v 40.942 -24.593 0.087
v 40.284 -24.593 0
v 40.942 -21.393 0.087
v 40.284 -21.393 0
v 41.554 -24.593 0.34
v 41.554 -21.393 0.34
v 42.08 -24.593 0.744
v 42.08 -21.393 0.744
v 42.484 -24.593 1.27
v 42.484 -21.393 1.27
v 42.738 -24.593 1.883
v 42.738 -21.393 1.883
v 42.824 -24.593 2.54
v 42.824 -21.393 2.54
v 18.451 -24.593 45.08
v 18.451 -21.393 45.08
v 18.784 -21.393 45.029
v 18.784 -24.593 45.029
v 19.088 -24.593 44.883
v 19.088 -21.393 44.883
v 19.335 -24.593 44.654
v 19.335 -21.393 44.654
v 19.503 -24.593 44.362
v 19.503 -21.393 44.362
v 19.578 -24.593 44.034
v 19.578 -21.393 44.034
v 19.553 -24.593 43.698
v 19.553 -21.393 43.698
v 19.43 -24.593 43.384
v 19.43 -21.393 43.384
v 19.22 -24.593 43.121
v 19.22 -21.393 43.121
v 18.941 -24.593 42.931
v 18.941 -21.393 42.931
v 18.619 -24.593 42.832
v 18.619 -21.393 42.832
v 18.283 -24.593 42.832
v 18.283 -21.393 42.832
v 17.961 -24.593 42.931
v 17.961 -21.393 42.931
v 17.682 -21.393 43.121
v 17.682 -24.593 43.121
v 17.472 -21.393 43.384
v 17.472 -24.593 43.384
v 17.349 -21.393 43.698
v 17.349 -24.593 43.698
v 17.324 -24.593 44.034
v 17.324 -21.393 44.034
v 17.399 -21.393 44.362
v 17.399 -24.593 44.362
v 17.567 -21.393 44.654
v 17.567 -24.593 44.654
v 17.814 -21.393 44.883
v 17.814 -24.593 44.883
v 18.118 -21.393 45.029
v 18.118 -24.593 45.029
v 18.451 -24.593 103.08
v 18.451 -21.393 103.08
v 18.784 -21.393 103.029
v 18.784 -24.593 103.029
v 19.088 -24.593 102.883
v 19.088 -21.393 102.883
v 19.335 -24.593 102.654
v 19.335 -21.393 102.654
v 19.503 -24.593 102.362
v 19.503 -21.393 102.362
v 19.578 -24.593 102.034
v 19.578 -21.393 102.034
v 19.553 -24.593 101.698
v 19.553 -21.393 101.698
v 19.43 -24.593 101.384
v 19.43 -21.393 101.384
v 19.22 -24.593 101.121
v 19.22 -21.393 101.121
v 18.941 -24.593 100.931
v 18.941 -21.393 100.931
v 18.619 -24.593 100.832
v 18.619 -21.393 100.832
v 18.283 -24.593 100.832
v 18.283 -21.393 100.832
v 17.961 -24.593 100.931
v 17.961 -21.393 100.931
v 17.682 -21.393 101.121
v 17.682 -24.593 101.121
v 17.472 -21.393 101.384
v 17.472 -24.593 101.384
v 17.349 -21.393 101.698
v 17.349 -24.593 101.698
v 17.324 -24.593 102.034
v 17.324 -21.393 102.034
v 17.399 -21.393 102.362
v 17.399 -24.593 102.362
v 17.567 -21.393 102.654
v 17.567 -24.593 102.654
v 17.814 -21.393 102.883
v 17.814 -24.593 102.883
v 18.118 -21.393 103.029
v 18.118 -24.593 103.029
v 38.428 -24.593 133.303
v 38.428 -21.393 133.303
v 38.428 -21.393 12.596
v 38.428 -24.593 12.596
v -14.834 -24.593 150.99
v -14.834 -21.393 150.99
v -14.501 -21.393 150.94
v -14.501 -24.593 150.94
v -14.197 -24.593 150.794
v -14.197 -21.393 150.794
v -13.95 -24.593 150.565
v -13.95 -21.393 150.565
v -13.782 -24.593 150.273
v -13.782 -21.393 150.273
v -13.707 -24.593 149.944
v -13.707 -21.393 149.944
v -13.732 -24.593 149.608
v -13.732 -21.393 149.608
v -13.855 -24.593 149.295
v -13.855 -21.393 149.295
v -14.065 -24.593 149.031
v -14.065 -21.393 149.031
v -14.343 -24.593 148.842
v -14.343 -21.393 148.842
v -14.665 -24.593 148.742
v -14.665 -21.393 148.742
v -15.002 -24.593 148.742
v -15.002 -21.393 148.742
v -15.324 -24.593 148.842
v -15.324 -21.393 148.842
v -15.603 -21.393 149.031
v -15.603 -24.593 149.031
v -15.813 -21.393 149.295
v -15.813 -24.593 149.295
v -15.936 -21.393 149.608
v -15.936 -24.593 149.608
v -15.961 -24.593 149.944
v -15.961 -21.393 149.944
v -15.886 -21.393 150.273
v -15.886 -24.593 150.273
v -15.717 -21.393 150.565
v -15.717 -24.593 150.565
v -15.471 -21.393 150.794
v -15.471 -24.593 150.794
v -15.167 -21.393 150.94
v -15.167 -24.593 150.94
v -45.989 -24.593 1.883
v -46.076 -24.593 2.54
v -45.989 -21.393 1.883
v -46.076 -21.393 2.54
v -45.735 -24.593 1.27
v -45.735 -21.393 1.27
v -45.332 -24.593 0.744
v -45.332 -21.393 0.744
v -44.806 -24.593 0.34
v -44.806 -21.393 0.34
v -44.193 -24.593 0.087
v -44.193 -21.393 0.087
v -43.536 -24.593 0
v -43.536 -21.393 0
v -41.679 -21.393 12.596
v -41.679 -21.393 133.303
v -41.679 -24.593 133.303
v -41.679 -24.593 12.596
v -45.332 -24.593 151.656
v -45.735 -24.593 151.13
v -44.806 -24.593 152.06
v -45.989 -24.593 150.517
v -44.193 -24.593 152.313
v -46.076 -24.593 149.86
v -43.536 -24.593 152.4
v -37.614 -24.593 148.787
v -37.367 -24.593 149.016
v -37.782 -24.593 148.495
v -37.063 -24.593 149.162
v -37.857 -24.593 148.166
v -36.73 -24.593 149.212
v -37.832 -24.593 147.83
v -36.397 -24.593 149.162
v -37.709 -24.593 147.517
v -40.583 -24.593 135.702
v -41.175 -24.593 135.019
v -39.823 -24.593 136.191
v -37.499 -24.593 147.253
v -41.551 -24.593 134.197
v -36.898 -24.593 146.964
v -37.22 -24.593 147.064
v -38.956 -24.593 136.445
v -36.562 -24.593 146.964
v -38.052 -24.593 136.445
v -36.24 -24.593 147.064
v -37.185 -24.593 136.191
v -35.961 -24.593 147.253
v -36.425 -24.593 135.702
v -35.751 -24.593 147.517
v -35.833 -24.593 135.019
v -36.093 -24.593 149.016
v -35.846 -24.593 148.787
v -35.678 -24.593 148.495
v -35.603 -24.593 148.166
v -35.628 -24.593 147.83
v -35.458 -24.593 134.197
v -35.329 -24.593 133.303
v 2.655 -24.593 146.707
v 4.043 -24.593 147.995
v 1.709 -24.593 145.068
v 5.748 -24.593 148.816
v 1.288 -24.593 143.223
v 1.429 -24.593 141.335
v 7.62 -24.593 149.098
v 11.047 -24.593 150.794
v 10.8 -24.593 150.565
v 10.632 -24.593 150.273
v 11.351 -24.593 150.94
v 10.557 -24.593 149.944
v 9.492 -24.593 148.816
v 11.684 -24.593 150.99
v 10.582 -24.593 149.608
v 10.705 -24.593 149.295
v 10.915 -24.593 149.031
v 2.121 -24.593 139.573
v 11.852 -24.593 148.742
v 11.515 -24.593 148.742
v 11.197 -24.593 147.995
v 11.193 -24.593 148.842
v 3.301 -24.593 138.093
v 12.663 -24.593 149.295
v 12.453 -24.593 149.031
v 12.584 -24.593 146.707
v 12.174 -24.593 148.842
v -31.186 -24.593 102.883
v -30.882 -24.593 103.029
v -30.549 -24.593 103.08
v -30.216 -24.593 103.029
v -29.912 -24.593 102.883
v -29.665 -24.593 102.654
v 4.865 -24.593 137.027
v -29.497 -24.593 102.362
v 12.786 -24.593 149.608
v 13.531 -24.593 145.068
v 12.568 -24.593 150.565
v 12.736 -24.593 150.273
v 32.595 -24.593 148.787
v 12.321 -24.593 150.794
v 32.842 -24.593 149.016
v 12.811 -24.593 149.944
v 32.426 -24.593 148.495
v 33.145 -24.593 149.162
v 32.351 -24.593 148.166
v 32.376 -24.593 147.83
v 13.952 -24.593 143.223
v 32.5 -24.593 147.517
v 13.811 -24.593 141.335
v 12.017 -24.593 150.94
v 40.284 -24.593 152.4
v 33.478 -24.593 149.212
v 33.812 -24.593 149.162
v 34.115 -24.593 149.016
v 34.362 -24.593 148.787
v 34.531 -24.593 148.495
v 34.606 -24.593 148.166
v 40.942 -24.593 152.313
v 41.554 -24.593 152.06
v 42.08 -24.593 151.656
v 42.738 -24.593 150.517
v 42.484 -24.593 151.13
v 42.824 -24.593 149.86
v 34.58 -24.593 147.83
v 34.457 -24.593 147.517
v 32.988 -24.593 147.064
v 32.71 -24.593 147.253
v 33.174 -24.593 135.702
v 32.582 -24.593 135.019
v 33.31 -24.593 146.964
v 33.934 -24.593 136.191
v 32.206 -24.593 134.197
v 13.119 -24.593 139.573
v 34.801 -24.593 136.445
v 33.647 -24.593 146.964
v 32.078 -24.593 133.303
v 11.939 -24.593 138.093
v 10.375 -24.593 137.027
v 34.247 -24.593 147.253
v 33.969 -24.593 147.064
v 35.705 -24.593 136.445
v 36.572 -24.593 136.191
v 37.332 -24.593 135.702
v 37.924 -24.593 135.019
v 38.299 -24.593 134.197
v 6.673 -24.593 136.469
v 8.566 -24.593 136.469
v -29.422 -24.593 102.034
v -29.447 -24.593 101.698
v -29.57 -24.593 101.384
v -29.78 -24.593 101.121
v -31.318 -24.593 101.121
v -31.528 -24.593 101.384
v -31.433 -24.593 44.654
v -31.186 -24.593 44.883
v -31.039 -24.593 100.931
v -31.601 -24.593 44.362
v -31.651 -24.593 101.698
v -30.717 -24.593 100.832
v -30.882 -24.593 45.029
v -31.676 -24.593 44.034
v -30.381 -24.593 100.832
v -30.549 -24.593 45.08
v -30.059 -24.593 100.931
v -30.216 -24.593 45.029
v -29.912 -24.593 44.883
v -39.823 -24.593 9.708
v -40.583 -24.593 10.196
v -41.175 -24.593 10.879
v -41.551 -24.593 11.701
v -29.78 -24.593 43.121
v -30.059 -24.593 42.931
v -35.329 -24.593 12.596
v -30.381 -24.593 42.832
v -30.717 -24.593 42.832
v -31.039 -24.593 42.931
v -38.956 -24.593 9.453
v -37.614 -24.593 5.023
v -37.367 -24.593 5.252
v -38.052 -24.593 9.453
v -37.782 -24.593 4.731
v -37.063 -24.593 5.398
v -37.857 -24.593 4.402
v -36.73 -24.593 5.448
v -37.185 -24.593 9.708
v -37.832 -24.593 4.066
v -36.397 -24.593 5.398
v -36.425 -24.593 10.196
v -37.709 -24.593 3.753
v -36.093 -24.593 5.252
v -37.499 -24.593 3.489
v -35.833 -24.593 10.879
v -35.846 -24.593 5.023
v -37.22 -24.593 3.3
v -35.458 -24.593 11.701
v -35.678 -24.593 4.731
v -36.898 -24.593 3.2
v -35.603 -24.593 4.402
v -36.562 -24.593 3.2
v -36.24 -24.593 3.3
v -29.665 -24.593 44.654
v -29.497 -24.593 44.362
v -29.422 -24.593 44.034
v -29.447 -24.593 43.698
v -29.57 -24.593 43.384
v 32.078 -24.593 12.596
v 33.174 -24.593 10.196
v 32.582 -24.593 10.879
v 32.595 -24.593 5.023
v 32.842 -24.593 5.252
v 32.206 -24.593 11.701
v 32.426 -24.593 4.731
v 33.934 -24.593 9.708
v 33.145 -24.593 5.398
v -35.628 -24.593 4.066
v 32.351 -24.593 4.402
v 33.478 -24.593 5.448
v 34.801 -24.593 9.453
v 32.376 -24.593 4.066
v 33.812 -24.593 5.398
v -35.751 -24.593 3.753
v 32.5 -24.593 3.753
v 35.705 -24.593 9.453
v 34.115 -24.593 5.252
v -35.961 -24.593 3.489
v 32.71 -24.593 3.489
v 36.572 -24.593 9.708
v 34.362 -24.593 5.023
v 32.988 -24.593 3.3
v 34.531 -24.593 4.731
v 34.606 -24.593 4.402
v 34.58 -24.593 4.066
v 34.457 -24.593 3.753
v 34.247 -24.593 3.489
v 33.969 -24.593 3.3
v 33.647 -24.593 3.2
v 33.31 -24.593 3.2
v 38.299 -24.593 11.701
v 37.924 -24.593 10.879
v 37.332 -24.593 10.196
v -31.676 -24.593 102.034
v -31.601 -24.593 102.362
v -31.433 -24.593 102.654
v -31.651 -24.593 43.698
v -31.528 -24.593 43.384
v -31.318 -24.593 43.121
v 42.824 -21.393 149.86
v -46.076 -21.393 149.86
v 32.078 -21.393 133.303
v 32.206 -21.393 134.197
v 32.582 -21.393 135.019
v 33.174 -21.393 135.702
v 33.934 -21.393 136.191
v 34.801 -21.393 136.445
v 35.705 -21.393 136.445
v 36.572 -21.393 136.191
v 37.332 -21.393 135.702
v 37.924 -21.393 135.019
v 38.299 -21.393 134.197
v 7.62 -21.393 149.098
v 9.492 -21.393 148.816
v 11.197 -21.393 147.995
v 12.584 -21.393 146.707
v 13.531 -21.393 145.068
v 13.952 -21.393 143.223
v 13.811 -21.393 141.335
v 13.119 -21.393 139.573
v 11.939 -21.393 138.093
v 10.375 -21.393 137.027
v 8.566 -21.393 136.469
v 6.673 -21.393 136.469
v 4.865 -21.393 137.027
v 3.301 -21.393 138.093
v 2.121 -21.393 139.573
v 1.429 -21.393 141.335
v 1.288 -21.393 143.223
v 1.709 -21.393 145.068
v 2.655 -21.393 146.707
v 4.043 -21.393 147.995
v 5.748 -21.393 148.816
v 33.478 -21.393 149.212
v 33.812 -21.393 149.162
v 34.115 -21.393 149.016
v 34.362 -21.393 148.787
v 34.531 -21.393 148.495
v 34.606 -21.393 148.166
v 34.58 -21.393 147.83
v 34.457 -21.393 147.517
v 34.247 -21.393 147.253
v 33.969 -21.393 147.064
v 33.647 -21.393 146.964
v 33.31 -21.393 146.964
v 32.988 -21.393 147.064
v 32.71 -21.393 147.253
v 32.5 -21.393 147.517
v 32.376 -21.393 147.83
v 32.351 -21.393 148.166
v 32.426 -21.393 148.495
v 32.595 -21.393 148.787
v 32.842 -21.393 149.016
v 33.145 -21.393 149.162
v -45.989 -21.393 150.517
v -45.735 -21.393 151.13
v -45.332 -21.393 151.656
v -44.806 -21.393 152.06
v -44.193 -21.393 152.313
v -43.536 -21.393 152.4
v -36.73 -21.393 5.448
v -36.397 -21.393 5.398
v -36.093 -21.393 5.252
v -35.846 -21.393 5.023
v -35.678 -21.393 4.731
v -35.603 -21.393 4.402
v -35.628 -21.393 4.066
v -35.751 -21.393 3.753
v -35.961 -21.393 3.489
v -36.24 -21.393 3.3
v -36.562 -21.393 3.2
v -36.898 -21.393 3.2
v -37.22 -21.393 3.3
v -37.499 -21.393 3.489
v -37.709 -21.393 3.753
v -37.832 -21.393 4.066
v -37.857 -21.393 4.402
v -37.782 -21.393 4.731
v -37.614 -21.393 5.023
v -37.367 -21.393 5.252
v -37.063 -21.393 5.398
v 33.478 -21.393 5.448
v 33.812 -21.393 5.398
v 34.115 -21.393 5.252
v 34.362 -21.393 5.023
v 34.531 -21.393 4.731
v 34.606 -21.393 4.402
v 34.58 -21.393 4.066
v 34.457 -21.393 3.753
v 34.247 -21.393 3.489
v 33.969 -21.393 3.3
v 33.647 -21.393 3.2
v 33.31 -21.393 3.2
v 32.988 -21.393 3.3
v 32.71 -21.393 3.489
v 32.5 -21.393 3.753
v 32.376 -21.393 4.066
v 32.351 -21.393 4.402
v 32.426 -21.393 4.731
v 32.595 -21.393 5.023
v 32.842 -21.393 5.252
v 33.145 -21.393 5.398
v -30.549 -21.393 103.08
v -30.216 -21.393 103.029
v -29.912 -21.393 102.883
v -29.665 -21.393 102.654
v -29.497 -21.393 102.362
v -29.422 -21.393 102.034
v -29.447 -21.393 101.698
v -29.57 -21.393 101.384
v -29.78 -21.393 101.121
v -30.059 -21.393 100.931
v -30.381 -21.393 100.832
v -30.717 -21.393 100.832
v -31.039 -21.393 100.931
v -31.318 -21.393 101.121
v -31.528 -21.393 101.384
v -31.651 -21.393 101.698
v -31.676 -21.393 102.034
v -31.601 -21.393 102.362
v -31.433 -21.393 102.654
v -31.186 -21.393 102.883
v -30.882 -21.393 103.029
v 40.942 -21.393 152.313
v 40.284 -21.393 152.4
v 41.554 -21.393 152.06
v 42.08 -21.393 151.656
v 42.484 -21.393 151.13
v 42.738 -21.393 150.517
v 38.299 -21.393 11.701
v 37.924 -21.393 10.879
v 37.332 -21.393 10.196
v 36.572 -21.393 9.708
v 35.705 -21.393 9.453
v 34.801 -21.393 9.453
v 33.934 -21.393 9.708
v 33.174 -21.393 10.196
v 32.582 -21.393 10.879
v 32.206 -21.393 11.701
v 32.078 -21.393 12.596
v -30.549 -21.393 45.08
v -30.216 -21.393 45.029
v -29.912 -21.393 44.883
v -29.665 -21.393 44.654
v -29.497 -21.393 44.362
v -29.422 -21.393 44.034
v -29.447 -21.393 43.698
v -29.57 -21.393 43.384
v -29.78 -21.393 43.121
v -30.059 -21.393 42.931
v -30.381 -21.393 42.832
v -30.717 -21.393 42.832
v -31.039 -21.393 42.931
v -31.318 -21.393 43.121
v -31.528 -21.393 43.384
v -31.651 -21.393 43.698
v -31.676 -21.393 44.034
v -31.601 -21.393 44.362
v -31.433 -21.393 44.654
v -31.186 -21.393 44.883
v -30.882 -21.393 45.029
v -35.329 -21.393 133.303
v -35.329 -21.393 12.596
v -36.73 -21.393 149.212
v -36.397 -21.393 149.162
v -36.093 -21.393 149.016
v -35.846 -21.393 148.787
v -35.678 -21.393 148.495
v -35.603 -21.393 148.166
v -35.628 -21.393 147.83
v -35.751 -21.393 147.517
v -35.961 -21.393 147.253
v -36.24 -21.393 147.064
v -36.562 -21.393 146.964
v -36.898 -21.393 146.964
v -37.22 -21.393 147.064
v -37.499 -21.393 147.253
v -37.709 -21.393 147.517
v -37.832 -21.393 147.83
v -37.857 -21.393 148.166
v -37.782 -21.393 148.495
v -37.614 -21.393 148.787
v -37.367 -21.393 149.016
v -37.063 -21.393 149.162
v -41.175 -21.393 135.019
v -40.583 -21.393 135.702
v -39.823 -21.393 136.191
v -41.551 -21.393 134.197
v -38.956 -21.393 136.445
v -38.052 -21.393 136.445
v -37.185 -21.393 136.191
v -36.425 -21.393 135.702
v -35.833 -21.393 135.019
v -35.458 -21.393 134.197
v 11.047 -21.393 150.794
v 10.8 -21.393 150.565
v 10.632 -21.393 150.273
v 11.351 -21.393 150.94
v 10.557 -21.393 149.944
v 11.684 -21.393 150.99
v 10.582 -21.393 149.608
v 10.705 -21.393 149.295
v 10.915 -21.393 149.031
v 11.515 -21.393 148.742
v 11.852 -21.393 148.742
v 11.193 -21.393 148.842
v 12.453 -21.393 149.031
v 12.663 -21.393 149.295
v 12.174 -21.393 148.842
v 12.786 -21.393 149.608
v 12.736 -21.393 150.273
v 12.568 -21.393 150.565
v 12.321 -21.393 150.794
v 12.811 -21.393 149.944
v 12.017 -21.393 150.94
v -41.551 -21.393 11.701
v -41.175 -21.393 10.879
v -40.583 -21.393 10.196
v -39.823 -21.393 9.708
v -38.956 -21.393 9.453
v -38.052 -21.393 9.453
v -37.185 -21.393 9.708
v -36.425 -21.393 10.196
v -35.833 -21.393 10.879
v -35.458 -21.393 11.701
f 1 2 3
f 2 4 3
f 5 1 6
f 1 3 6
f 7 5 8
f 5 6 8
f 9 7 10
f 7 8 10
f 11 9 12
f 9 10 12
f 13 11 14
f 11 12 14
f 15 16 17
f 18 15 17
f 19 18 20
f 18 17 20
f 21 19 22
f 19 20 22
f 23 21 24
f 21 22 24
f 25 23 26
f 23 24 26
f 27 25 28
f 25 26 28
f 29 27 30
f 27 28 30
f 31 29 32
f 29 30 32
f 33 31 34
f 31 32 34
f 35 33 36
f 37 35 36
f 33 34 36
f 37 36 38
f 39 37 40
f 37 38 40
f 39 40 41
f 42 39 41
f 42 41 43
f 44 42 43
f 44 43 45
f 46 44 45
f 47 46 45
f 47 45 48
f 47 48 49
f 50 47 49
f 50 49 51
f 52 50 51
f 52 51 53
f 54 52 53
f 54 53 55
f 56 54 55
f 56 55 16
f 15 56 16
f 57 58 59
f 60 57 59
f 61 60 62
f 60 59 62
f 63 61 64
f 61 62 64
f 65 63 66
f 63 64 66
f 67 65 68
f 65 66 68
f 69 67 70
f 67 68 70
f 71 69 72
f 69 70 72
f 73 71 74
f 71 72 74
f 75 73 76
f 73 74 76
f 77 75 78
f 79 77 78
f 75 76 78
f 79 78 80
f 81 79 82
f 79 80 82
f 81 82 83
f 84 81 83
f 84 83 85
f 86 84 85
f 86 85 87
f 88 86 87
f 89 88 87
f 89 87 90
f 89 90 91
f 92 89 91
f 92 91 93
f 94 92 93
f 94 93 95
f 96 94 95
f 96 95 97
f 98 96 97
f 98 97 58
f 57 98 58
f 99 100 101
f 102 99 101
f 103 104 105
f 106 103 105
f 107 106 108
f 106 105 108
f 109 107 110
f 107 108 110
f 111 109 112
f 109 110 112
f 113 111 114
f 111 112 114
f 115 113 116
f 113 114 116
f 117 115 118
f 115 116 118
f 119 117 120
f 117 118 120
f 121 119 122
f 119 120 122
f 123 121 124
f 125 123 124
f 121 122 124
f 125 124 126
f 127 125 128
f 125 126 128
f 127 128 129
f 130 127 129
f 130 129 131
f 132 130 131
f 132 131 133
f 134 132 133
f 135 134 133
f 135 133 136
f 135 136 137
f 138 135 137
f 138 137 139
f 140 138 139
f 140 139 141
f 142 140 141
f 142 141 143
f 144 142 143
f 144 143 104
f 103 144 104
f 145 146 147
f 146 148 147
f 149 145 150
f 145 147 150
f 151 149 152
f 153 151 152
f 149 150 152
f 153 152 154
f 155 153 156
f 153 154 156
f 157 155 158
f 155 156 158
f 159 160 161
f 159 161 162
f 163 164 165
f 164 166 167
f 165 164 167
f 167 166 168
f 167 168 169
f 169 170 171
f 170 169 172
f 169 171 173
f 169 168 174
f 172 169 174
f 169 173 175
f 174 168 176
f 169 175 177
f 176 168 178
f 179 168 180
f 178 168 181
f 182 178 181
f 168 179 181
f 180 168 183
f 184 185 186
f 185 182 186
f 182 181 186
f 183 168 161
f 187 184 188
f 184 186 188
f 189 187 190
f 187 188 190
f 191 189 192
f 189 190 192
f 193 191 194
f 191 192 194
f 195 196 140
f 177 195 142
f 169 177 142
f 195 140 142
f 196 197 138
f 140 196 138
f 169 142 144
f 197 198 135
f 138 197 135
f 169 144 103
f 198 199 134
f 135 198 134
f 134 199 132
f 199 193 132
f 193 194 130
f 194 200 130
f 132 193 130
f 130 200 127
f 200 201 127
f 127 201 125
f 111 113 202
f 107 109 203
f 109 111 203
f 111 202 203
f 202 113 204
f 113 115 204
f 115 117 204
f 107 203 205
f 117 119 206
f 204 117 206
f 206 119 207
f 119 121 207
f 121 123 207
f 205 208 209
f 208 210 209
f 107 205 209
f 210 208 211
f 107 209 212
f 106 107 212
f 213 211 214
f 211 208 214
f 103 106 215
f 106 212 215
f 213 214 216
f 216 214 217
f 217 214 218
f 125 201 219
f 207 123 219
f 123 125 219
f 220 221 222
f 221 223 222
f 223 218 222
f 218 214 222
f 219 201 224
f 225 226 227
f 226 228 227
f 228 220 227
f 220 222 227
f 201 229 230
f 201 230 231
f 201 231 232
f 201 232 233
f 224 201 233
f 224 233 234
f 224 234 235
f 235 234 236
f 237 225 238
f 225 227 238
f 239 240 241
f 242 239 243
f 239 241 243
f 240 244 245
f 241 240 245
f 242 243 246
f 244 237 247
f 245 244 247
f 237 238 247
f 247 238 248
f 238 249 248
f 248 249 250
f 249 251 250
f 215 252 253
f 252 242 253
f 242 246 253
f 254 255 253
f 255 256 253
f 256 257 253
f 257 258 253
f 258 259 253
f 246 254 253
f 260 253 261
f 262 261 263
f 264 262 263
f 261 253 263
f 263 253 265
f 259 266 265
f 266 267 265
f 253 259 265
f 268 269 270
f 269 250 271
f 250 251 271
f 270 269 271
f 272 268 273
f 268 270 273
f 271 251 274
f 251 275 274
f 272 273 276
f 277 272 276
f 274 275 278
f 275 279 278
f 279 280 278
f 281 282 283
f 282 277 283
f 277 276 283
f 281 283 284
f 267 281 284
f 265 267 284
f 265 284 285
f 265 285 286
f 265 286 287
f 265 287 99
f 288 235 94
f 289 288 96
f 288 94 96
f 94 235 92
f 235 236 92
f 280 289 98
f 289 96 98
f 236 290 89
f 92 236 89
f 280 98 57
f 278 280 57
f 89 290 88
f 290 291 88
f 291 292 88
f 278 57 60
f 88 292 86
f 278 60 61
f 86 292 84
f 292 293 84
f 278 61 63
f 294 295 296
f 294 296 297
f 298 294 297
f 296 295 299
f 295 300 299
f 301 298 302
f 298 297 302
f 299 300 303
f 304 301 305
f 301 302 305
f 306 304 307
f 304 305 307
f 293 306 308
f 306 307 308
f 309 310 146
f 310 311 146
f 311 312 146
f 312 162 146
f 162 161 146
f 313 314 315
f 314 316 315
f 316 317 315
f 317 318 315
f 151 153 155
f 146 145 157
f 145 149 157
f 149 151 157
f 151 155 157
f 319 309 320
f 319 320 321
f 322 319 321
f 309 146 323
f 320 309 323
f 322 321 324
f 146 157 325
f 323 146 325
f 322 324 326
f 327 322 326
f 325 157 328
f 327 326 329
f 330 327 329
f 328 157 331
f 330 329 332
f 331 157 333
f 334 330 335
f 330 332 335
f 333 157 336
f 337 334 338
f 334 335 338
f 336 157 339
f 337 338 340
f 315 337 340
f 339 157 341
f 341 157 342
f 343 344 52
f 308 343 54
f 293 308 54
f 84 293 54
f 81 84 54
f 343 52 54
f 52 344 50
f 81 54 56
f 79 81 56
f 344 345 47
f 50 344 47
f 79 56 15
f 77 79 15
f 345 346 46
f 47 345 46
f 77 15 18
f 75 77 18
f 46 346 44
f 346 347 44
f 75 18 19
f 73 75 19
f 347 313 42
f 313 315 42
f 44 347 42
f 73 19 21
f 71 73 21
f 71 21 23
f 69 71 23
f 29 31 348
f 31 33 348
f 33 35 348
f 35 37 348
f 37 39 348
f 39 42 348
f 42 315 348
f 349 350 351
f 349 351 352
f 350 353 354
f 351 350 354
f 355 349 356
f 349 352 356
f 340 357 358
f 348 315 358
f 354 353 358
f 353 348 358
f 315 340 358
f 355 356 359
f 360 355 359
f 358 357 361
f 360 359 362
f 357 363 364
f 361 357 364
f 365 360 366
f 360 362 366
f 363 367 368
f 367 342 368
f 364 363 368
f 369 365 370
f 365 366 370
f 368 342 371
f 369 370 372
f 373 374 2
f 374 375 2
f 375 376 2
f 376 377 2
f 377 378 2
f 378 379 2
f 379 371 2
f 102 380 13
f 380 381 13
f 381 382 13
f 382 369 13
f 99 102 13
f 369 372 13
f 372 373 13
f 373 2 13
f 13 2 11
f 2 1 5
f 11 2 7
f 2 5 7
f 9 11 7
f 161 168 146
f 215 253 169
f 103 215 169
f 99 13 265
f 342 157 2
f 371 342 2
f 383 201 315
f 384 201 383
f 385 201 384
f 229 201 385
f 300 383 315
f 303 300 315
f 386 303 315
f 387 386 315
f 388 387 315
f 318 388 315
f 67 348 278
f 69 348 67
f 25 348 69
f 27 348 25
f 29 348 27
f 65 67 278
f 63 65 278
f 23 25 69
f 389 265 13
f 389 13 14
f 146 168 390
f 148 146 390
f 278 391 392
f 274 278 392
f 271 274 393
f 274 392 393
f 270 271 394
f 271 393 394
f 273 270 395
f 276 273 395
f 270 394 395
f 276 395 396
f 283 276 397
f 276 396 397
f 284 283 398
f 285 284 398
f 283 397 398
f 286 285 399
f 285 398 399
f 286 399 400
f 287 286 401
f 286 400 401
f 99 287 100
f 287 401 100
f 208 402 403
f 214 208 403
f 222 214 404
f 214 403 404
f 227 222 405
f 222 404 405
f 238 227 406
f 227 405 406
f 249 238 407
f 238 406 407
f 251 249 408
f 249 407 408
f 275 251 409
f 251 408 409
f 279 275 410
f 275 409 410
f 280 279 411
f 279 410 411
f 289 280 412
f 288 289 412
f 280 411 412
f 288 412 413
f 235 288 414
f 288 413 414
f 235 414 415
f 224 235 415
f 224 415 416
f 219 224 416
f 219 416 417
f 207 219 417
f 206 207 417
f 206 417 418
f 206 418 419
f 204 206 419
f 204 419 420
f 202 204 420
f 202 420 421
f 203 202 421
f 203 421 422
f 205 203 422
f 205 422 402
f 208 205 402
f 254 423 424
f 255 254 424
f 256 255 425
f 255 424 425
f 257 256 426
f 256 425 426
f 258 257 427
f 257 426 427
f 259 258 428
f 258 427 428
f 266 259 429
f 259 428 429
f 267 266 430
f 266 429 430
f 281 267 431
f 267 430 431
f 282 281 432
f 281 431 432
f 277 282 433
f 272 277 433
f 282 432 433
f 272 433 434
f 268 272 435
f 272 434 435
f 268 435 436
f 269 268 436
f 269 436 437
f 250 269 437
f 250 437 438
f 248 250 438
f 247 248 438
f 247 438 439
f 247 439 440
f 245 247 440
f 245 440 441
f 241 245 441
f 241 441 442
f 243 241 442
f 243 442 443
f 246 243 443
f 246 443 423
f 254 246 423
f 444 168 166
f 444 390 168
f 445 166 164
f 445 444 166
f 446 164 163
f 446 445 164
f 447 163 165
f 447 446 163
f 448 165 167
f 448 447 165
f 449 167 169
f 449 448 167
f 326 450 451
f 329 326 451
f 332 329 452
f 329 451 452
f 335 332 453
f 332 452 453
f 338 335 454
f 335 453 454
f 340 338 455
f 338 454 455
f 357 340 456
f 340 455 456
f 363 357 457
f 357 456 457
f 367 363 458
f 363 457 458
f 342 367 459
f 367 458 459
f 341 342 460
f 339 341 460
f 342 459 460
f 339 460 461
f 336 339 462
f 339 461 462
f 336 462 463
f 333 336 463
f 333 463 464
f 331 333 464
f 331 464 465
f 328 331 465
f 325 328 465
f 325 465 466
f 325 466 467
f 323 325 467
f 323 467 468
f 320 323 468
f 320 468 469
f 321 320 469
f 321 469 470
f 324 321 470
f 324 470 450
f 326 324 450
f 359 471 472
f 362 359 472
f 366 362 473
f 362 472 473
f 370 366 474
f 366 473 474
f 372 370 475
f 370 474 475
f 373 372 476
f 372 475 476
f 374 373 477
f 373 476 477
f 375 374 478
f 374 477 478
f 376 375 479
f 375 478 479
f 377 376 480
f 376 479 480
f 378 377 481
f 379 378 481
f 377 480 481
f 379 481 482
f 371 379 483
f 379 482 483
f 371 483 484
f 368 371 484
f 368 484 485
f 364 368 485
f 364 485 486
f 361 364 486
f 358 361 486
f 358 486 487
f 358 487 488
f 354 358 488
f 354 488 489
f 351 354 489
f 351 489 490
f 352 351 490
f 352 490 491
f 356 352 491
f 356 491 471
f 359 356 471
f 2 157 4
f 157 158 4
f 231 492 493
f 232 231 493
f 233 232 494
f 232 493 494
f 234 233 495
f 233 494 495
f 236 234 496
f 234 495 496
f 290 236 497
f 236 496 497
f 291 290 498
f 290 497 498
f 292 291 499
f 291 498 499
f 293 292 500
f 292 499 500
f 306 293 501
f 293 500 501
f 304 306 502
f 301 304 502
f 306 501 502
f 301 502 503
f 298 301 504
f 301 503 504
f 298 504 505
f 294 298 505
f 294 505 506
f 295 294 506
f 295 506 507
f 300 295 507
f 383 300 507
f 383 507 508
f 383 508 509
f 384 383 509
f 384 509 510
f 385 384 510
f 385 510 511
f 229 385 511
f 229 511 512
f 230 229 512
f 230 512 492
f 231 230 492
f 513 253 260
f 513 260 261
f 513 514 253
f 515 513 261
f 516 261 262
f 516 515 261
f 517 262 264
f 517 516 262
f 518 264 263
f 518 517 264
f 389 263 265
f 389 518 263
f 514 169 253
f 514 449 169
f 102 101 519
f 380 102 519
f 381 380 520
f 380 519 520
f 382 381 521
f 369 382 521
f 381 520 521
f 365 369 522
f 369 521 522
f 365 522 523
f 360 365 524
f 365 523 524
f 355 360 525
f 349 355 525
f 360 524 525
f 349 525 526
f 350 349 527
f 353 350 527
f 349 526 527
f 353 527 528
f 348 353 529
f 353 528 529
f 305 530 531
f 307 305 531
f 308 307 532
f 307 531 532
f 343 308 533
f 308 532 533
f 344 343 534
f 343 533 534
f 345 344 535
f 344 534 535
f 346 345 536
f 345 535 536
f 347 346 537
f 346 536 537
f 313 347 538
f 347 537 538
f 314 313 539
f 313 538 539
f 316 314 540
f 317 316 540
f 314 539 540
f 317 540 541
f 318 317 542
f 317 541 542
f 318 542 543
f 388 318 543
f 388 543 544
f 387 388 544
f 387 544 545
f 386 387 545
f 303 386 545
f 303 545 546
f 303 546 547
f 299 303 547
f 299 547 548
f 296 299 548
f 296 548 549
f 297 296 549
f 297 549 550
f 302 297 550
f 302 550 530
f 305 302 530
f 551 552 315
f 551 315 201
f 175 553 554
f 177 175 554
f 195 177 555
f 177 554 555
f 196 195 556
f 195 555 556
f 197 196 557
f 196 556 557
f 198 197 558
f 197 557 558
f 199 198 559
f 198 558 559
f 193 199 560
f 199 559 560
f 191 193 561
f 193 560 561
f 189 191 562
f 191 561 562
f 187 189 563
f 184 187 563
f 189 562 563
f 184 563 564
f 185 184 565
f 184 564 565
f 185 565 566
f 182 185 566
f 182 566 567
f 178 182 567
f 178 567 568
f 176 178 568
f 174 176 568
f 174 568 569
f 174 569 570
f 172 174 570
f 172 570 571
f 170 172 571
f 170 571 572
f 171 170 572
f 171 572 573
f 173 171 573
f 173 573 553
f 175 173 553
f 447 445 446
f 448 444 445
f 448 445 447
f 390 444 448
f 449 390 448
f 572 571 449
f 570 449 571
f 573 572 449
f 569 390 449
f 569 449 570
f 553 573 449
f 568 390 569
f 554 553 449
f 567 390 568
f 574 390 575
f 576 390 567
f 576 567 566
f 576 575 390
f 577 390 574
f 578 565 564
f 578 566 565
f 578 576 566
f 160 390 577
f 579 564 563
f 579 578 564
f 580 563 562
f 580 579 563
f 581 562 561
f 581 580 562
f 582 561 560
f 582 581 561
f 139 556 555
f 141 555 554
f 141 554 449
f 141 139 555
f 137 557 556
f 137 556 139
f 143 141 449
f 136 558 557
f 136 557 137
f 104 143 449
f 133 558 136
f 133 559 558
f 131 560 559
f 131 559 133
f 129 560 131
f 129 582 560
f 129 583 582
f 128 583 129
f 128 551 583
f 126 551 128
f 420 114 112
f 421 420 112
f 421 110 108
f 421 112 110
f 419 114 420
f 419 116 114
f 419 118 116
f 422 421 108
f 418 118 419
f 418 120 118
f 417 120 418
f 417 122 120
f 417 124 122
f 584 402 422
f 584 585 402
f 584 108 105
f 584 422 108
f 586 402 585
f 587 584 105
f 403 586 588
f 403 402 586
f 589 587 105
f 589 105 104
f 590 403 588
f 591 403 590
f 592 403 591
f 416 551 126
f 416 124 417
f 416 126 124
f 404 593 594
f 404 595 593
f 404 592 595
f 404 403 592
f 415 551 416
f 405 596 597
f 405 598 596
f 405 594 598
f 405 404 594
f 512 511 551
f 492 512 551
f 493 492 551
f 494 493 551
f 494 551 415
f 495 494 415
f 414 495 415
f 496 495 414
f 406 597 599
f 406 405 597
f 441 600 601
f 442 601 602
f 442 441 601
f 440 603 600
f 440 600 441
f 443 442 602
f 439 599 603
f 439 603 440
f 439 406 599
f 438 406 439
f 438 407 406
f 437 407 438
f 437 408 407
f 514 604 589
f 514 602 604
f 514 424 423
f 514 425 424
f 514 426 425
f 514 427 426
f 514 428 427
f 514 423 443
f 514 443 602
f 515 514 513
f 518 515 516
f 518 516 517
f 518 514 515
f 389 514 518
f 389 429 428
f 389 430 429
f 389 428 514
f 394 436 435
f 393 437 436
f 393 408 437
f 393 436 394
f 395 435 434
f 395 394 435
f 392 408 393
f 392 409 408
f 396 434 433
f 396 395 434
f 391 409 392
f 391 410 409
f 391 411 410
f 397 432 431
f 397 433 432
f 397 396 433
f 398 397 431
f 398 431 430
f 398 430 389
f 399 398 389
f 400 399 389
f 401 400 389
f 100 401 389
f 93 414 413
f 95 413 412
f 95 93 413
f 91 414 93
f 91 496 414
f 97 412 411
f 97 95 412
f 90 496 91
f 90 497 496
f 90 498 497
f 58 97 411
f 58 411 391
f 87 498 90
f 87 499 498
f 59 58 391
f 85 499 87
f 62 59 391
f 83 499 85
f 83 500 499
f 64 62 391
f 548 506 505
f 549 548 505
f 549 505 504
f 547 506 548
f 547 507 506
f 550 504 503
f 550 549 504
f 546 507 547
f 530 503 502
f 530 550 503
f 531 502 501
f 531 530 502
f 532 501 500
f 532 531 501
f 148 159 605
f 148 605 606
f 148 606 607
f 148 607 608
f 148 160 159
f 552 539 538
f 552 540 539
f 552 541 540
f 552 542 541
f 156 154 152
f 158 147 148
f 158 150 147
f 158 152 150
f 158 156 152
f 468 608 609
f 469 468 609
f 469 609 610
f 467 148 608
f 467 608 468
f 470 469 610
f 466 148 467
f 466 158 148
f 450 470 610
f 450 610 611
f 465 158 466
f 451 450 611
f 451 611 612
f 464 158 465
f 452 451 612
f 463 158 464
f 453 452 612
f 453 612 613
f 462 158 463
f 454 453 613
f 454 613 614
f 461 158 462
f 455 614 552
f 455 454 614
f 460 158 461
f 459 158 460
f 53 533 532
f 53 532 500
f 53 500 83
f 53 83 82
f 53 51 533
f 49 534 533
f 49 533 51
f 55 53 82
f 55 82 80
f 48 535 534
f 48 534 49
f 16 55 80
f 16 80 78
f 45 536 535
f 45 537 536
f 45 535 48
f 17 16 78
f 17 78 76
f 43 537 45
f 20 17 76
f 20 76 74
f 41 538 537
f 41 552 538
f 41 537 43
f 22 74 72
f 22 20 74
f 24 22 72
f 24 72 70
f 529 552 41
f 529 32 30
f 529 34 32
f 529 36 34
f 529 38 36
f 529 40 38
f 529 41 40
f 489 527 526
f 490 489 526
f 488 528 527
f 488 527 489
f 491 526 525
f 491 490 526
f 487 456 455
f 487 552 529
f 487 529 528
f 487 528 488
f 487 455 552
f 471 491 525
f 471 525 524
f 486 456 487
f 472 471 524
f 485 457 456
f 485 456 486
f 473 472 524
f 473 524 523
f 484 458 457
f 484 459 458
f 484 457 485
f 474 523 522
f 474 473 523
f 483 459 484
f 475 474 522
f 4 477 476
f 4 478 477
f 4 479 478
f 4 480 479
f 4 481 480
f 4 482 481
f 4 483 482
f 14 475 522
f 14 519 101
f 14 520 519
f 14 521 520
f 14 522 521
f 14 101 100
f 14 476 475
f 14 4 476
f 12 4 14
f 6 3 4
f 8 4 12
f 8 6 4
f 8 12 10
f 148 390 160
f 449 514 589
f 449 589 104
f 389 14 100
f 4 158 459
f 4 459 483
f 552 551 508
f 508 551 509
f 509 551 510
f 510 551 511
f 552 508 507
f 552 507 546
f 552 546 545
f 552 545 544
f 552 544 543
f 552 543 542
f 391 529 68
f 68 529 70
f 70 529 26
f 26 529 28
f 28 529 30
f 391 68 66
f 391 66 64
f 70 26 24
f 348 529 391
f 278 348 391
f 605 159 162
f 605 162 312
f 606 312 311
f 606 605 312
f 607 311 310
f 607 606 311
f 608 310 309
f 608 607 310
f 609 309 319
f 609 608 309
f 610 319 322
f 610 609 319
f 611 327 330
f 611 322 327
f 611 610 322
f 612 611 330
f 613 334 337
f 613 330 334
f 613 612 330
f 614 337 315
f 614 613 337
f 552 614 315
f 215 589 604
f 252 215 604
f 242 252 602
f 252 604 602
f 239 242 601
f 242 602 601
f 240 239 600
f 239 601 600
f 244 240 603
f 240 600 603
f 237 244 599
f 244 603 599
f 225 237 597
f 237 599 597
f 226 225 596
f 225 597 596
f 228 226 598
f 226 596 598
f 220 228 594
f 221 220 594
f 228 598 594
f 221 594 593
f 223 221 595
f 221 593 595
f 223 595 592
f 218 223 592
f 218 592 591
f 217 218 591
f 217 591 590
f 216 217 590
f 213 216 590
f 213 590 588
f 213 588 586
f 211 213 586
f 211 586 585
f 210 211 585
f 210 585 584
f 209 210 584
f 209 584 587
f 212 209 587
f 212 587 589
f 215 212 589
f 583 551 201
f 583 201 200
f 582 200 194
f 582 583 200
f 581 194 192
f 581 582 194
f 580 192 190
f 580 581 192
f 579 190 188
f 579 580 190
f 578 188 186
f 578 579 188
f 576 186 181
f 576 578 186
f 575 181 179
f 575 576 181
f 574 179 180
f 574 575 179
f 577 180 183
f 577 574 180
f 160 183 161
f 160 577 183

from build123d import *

# Parameters (mm, degrees)
SKETCH2_W           = 88.9
SKETCH2_H           = 3.2004
BOSS_EXTRUDE1_DEPTH = 152.4
SKETCH3_R           = 1.1303
SKETCH3_R_2         = 6.35
CUT_EXTRUDE1_DEPTH  = 160.245032004
FILLET2_R           = 2.54


with BuildPart() as part:
    # Sketch2 → Boss-Extrude1 (new body)
    with BuildSketch(Plane.XY):
        with Locations((-1.625781684, -22.993244248)):
            Rectangle(SKETCH2_W, SKETCH2_H)
    extrude(amount=BOSS_EXTRUDE1_DEPTH)

    # Sketch3 → Cut-Extrude1 (cut, through all)
    with BuildSketch(Plane(origin=(0, -21.393044248, 0), x_dir=(-1, 0, 0), z_dir=(0, 1, 0))):
        with Locations(Location((14.833781684, 149.86, 0), (0, 0, 90))):
            Circle(SKETCH3_R)
        with Locations(Location((-11.683818316, 149.86, 0), (0, 0, 90))):
            Circle(SKETCH3_R)
        with Locations(Location((-7.619818316, 142.748, 0), (0, 0, 90))):
            Circle(SKETCH3_R_2)
        with Locations(Location((-33.478453416, 148.082, 0), (0, 0, 90))):
            Circle(SKETCH3_R)
        with Locations(Location((36.730016784, 148.082, 0), (0, 0, 90))):
            Circle(SKETCH3_R)
        with Locations(Location((-33.478453416, 4.318, 0), (0, 0, 90))):
            Circle(SKETCH3_R)
        with Locations(Location((36.730016784, 4.318, 0), (0, 0, 90))):
            Circle(SKETCH3_R)
        with Locations(Location((-18.450986138, 43.949273109, 0), (0, 0, 90))):
            Circle(SKETCH3_R)
        with Locations(Location((-18.450986138, 101.949273109, 0), (0, 0, 90))):
            Circle(SKETCH3_R)
        with Locations(Location((30.549013862, 101.949273109, 0), (0, 0, 90))):
            Circle(SKETCH3_R)
        with Locations(Location((30.549013862, 43.949273109, 0), (0, 0, 90))):
            Circle(SKETCH3_R)
        with BuildLine():
            Line((35.32929924, 12.595958552), (35.32929924, 133.302587666))
            ThreePointArc((35.32929924, 133.302587666), (38.50429924, 136.477587666), (41.67929924, 133.302587666))
            Line((41.67929924, 133.302587666), (41.67929924, 12.595958552))
            ThreePointArc((41.67929924, 12.595958552), (38.50429924, 9.420958552), (35.32929924, 12.595958552))
        make_face()
        with BuildLine():
            Line((-32.077735872, 12.595958552), (-32.077735872, 133.302587666))
            ThreePointArc((-32.077735872, 133.302587666), (-35.252735872, 136.477587666), (-38.427735872, 133.302587666))
            Line((-38.427735872, 133.302587666), (-38.427735872, 12.595958552))
            ThreePointArc((-38.427735872, 12.595958552), (-35.252735872, 9.420958552), (-32.077735872, 12.595958552))
        make_face()
    extrude(amount=-CUT_EXTRUDE1_DEPTH, mode=Mode.SUBTRACT)

    # Fillet2
    fillet2_edges = [part.edges().sort_by_distance(p)[0] for p in [
        (42.824218316, -22.993244248, 152.4),
        (-46.075781684, -22.993244248, 152.4),
        (42.824218316, -22.993244248, 0),
        (-46.075781684, -22.993244248, 0),
    ]]
    fillet(fillet2_edges, radius=FILLET2_R)


solid = part.part
